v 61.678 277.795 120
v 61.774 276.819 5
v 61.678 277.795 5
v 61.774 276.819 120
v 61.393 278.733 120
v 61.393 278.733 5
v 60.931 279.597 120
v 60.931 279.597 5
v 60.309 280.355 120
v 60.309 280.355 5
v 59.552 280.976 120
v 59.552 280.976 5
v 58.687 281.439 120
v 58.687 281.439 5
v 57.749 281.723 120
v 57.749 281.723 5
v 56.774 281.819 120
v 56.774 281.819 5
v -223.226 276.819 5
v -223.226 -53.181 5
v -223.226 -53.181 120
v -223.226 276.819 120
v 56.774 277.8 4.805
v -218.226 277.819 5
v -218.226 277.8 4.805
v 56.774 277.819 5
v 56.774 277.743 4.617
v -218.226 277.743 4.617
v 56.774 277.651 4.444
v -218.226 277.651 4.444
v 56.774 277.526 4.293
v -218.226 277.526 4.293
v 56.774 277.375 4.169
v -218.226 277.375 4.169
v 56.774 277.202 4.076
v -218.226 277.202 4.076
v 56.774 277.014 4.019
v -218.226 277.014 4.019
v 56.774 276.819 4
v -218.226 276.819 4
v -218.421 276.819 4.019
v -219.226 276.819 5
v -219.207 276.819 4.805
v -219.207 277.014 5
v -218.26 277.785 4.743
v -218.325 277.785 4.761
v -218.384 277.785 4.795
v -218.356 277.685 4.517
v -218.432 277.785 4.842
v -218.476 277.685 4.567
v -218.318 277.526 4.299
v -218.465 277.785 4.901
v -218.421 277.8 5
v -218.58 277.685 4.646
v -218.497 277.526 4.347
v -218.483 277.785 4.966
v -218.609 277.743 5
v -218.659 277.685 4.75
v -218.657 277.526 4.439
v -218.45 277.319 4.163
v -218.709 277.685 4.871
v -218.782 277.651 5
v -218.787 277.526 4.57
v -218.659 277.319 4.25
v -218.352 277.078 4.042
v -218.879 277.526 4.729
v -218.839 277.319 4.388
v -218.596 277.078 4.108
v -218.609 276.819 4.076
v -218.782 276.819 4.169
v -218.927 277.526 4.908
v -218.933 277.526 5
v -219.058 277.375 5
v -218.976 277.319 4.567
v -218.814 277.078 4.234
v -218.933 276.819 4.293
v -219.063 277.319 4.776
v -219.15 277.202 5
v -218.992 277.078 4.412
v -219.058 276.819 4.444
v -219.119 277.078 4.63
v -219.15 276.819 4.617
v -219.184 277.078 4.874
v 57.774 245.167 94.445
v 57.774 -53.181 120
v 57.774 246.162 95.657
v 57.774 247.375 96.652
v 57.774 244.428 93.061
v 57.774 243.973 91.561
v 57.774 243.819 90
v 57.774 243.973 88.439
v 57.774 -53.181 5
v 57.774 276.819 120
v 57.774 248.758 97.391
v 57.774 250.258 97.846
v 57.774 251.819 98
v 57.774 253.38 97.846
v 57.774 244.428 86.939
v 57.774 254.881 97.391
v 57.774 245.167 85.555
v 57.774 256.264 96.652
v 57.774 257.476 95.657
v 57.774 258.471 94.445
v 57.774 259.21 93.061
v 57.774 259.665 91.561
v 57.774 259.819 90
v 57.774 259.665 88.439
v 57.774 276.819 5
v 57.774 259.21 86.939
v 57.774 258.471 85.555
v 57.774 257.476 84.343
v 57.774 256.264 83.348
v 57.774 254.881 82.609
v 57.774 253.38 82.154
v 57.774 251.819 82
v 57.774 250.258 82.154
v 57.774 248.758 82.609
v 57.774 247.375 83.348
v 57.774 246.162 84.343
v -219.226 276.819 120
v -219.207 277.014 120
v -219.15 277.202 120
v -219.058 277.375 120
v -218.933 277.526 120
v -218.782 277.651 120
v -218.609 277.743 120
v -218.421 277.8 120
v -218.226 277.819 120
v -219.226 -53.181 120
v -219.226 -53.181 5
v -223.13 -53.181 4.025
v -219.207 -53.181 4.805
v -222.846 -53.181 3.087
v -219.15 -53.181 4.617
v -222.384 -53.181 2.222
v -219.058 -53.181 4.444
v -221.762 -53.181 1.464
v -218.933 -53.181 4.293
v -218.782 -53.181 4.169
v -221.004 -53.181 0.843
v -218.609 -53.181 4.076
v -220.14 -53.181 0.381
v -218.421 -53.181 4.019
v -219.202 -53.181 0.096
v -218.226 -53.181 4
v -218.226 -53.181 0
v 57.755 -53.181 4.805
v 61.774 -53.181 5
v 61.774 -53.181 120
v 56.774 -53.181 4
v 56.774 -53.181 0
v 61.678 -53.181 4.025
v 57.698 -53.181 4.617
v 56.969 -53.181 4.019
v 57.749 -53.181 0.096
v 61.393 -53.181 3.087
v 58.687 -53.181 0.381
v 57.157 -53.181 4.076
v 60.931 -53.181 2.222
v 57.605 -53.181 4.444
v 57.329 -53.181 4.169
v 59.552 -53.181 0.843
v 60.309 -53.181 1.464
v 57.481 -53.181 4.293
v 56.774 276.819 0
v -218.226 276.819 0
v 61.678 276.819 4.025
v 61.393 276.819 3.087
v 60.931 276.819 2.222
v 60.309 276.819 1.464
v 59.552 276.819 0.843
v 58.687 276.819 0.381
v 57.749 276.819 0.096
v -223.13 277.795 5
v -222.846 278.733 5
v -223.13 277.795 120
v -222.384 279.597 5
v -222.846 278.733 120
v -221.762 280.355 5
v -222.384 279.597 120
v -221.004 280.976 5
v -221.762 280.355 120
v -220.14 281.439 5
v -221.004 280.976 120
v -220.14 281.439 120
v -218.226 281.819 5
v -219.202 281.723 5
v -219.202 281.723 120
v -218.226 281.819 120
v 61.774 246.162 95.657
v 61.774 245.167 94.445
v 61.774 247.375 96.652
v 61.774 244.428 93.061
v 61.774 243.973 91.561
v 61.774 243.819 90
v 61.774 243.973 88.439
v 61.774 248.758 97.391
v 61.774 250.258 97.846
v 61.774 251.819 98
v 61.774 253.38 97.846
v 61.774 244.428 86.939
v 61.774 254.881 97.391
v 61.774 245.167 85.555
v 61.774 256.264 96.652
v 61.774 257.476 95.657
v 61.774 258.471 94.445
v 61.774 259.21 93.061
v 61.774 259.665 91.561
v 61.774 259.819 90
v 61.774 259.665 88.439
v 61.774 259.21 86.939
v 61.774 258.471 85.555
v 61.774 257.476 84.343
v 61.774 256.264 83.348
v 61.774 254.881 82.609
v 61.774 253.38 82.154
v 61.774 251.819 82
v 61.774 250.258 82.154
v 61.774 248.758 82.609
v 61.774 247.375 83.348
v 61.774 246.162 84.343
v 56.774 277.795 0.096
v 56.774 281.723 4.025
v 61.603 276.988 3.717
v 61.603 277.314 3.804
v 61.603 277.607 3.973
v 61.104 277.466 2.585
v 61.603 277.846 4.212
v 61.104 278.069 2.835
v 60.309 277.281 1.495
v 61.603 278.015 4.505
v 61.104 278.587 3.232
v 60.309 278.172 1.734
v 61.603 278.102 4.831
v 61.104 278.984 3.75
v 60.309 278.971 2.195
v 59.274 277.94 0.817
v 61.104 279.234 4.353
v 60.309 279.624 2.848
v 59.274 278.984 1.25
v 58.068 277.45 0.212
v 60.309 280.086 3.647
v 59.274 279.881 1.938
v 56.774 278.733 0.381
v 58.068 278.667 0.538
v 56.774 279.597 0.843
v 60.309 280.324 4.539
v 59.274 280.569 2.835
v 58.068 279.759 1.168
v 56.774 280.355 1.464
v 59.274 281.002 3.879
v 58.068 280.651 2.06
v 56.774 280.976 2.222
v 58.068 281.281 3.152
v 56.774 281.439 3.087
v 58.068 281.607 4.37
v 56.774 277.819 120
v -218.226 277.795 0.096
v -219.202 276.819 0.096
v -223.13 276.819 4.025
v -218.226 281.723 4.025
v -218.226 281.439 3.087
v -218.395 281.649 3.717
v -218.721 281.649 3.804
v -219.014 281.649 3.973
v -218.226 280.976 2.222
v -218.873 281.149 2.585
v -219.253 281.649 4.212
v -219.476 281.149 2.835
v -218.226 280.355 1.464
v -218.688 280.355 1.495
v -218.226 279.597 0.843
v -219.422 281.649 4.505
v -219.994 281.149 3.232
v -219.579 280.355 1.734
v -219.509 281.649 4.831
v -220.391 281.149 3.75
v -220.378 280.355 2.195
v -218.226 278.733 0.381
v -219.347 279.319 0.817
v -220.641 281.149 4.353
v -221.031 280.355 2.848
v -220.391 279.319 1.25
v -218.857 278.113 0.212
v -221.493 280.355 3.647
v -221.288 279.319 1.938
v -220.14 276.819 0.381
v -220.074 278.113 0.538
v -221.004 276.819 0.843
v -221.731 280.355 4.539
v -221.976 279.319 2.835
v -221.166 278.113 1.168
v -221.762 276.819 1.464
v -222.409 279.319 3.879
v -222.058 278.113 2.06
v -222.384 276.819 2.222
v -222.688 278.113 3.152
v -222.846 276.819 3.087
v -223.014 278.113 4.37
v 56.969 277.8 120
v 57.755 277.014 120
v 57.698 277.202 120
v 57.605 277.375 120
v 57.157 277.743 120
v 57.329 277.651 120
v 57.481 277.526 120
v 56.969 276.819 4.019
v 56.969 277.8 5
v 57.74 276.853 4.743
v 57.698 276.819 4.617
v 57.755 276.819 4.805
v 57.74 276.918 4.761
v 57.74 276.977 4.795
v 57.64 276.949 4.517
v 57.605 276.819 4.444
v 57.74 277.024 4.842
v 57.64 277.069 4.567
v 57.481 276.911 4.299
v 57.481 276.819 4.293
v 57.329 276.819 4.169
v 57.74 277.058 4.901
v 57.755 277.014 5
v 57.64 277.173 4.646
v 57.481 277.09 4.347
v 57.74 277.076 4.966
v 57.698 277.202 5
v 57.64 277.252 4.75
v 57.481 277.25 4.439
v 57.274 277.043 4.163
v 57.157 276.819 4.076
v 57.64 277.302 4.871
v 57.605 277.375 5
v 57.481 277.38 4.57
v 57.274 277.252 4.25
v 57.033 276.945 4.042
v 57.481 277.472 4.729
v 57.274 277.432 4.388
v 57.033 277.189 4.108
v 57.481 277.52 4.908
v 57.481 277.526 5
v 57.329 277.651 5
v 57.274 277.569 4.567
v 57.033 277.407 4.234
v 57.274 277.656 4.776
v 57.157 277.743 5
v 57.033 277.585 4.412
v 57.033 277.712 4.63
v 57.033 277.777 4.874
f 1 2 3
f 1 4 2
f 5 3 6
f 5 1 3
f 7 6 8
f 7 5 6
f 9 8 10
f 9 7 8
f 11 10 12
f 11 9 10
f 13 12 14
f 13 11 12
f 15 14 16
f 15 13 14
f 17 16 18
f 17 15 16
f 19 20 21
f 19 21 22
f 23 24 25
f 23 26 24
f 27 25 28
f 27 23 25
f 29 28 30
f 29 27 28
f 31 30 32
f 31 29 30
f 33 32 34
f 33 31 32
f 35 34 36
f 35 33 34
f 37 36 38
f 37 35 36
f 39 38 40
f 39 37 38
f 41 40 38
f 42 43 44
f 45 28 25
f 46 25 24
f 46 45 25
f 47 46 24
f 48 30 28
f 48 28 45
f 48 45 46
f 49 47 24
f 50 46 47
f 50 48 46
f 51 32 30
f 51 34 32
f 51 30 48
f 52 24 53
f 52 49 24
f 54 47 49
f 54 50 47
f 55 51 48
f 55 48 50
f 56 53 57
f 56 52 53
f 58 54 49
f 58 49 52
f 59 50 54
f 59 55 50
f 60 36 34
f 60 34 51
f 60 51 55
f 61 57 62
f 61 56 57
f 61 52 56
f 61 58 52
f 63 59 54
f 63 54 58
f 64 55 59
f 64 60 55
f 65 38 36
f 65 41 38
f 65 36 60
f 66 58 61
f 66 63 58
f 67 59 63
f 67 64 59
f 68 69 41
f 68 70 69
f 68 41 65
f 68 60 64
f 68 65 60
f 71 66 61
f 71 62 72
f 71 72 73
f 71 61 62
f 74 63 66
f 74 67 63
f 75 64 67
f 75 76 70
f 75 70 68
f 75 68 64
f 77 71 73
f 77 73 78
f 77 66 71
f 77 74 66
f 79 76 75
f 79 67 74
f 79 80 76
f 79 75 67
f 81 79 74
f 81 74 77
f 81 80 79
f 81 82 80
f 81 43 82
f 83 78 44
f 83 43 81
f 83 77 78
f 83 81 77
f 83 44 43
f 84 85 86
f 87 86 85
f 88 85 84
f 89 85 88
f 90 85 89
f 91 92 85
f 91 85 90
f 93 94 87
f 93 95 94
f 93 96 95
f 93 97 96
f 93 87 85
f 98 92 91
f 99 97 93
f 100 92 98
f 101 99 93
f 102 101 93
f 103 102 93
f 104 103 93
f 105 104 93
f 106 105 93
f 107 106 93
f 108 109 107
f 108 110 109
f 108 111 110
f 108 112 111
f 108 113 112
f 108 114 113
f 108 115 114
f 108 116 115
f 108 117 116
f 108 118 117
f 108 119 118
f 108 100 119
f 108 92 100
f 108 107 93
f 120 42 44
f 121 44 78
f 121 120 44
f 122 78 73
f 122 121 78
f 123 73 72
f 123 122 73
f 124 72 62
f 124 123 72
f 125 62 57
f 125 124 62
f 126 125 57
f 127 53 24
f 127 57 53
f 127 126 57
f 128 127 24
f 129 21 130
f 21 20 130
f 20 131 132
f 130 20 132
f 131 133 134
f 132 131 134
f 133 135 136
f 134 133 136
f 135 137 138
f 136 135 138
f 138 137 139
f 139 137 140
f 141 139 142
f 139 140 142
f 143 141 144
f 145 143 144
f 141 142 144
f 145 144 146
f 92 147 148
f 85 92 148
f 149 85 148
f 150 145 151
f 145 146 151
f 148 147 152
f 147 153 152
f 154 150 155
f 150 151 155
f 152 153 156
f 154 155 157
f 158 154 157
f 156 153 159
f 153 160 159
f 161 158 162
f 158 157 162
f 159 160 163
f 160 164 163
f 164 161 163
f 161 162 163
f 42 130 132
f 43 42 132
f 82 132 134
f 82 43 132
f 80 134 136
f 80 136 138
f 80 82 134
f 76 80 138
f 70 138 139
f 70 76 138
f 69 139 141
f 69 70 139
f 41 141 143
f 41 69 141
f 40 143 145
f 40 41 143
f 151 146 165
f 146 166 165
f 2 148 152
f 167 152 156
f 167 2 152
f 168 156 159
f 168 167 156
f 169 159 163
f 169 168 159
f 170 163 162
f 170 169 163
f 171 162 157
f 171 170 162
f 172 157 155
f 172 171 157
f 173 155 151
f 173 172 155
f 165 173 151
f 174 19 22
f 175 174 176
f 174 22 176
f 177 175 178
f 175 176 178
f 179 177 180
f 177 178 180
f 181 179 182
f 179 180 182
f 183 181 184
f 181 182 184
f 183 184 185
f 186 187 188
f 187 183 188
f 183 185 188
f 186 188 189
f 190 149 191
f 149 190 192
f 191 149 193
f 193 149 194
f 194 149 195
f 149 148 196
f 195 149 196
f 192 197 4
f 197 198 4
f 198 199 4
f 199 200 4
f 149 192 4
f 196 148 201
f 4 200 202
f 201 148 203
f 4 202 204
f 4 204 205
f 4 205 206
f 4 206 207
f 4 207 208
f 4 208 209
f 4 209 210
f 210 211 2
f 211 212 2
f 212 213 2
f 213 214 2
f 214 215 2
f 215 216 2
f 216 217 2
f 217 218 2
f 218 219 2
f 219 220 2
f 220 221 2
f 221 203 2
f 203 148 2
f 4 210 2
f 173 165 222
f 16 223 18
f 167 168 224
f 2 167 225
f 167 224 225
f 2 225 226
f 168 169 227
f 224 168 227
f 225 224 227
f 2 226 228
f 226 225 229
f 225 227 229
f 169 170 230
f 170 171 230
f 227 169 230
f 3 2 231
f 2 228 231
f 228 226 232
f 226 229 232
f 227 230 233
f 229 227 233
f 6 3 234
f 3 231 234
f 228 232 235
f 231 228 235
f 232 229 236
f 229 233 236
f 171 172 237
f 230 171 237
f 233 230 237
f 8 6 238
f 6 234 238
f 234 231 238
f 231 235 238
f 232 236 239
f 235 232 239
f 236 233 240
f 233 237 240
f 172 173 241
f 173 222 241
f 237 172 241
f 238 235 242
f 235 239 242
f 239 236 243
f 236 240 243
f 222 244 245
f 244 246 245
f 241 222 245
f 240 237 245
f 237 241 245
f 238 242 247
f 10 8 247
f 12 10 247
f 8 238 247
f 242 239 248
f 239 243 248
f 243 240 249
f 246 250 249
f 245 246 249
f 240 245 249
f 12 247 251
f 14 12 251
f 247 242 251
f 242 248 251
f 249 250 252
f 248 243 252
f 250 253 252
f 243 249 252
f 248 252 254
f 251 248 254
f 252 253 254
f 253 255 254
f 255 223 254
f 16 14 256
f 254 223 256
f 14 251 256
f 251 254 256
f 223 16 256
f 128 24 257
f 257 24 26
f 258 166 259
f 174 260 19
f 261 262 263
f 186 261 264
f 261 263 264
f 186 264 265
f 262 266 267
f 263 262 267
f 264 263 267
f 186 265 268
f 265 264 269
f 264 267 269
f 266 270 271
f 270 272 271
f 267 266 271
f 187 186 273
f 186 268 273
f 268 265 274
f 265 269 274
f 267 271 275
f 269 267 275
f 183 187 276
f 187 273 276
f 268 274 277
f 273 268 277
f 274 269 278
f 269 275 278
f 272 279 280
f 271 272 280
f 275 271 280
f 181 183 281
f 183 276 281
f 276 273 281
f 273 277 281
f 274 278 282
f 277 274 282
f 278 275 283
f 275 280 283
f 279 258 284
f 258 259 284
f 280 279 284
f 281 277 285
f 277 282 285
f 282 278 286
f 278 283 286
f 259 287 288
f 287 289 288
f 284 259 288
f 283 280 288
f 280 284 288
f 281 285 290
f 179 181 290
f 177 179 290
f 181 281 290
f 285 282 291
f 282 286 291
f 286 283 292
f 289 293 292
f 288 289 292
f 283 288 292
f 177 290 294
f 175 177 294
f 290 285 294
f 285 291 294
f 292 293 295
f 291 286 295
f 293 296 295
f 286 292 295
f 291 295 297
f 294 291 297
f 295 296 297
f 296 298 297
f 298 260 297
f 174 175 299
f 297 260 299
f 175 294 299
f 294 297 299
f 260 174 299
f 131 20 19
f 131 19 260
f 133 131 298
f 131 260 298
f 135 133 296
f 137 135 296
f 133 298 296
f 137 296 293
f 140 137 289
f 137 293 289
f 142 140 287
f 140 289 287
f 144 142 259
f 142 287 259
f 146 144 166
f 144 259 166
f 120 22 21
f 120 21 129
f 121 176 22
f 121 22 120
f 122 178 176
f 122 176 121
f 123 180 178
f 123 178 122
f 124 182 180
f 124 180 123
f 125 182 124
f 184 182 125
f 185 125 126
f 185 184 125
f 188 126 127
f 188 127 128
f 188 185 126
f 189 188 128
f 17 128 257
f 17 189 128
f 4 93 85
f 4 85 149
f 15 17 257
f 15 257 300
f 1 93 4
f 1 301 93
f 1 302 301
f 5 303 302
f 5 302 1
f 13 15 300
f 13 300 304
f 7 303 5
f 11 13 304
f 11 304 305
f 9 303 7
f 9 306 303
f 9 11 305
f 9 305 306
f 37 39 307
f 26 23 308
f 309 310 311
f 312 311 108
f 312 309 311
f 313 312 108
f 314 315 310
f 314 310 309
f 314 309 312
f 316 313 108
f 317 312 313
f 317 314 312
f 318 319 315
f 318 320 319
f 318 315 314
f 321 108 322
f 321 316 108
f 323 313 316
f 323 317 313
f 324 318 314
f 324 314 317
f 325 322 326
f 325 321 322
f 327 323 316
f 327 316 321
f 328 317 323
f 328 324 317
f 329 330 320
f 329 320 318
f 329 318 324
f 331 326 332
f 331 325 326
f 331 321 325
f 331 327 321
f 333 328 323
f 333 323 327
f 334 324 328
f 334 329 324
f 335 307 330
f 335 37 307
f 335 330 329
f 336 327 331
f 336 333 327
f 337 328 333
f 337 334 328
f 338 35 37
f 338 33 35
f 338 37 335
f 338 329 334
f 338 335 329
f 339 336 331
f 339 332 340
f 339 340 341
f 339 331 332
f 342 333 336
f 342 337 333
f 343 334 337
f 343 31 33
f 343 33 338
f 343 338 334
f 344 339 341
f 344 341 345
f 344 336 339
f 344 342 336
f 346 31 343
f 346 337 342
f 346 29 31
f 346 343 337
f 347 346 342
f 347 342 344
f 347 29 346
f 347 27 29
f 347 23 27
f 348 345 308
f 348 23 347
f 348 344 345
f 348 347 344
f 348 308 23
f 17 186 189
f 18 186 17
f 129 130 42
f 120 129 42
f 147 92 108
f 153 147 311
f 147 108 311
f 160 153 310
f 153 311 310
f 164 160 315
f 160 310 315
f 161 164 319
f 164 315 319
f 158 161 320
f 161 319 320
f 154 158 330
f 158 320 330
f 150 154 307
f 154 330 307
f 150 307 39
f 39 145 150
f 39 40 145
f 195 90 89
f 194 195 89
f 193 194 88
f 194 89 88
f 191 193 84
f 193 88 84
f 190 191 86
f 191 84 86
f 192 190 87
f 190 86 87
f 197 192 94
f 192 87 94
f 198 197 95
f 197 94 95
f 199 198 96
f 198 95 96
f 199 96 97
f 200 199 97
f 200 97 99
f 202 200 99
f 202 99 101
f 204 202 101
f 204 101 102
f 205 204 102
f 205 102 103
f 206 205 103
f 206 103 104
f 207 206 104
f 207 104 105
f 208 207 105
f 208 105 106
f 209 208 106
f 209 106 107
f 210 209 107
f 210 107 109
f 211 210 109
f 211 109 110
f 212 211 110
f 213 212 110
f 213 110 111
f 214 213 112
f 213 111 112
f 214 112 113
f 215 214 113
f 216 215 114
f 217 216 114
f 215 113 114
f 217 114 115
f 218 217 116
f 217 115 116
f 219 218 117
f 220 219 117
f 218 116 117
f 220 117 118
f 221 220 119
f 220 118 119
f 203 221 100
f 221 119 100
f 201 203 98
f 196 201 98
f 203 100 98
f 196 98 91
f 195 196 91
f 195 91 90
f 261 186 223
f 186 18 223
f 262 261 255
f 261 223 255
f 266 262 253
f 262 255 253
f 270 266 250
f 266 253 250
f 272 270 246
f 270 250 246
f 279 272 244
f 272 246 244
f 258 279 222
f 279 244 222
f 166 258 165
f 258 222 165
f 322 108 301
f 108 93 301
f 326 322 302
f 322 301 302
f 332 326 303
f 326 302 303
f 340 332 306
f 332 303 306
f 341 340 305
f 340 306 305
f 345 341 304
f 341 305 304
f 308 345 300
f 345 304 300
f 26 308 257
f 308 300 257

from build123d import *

# Parameters (mm, degrees)
F0_W     = 285
F0_H     = 335
F1_DEPTH = 120
F2_R     = 5
F3_T     = -4
F5_D     = 16
F5_DEPTH = 10


with BuildPart() as f1:
    # F0 (on Top) → F1 (new body)
    with BuildSketch(Plane.XY):
        with Locations((-80.726171, 114.31913)):
            Rectangle(F0_W, F0_H)
    extrude(amount=F1_DEPTH)

    # F2
    f2_edges = [f1.edges().sort_by_distance(p)[0] for p in [
        (-223.226171, 114.31913, 0),
        (-80.726171, 281.81913, 0),
        (61.773829, 114.31913, 0),
        (-223.226171, 281.81913, 60),
        (61.773829, 281.81913, 60),
    ]]
    fillet(f2_edges, radius=F2_R)

    # F3
    f3_openings = [f1.faces().sort_by_distance(p)[0] for p in [
        (-80.726171, 114.300429, 120),
        (-80.726171, -53.18087, 60.01848),
    ]]
    offset(amount=F3_T, openings=f3_openings)

    # F5
    with Locations(Plane.YZ.offset(61.773829)):
        with Locations((251.81913, 90)):
            Hole(F5_D / 2, depth=F5_DEPTH)


solid = f1.part
